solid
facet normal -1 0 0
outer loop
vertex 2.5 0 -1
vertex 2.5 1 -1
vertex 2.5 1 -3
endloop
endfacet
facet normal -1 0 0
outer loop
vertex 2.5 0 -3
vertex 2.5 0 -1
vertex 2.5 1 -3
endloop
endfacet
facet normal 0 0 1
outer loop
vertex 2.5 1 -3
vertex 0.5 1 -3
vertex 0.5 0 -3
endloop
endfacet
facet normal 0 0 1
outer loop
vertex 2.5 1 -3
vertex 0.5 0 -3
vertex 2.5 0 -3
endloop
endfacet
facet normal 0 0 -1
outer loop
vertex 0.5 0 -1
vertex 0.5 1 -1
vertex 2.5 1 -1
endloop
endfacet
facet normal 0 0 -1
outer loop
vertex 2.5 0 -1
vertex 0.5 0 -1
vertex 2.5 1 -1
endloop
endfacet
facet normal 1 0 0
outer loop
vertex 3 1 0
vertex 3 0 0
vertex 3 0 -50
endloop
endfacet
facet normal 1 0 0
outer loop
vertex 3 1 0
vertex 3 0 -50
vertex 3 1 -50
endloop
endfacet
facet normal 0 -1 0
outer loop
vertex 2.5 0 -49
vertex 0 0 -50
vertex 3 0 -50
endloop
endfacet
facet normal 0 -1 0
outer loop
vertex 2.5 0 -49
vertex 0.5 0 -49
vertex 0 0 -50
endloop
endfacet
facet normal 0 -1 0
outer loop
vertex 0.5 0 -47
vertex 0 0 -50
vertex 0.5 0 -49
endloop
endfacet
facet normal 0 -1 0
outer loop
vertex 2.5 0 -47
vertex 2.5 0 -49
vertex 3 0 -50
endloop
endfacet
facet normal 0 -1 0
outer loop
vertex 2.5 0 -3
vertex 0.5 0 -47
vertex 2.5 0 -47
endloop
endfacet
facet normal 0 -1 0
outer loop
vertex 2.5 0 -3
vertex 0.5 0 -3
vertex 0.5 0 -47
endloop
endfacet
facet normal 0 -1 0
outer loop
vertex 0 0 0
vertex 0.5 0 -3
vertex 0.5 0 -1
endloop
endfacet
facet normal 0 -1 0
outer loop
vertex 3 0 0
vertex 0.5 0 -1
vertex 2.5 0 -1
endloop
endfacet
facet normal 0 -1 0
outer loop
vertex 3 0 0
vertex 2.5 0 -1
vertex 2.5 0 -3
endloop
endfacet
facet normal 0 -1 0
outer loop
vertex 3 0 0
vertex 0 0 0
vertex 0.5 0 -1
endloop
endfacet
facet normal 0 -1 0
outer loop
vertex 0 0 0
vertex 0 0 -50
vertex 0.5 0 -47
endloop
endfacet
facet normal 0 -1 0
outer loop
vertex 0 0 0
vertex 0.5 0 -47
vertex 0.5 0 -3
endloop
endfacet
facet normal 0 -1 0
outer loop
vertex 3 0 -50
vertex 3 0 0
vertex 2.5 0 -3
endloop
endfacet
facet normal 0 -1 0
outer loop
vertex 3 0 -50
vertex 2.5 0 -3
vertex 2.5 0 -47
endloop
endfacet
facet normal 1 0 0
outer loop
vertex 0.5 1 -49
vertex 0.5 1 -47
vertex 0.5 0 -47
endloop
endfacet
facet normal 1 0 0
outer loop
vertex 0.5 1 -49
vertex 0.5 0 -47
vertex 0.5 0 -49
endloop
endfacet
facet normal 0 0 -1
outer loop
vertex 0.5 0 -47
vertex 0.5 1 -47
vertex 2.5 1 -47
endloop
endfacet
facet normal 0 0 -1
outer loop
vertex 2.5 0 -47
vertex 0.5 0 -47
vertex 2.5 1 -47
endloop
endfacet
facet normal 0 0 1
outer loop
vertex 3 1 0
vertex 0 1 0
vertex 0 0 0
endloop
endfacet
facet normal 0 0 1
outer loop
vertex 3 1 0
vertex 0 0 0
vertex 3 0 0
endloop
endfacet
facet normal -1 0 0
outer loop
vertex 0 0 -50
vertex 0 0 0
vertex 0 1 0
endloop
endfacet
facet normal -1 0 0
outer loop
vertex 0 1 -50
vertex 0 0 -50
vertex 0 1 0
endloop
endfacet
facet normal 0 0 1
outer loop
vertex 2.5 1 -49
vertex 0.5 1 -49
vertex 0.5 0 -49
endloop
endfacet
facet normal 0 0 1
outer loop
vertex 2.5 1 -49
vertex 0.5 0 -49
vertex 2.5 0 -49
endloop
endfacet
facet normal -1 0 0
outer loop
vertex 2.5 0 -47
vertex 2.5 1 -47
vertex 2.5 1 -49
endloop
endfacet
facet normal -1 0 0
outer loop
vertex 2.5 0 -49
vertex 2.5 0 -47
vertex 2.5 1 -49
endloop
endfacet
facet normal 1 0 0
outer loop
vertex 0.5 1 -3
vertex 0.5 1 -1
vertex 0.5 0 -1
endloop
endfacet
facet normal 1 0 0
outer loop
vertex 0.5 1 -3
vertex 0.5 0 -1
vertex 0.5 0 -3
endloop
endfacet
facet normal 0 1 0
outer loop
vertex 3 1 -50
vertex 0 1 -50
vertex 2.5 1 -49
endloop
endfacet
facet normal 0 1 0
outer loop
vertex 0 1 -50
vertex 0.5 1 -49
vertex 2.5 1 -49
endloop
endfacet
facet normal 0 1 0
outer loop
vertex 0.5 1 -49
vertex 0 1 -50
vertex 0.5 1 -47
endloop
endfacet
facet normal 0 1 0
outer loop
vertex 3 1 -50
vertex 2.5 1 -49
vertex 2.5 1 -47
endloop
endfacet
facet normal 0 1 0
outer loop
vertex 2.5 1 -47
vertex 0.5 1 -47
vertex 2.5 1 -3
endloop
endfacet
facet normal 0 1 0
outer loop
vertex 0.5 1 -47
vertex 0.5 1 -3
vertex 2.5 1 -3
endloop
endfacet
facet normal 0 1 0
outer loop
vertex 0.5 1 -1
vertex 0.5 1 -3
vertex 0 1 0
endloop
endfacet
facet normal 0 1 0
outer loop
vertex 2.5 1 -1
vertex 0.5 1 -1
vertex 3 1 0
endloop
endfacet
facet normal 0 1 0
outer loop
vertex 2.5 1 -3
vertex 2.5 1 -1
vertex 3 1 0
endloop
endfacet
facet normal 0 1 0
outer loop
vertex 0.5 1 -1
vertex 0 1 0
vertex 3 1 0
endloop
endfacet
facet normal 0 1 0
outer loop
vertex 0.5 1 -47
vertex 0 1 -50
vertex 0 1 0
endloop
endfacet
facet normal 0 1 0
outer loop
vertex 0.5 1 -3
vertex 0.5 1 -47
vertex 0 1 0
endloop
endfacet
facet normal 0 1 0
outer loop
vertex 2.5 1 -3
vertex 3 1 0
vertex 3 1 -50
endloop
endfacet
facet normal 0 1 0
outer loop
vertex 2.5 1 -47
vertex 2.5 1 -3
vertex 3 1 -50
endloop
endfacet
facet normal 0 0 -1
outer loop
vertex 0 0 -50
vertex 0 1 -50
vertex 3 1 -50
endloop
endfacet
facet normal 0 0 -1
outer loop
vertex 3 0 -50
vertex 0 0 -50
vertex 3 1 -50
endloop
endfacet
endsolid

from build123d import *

# Parameters (mm, degrees)
ESBO_O1_W                = 3
ESBO_O1_H                = 1
RESSALTO_EXTRUS_O1_DEPTH = 50
ESBO_O3_W                = 2
ESBO_O3_H                = 2
CORTE_EXTRUS_O1_DEPTH    = 44


with BuildPart() as part:
    # Esboço1 → Ressalto-extrusão1 (new body)
    with BuildSketch(Plane.XY):
        with Locations((1.5, 0.5)):
            Rectangle(ESBO_O1_W, ESBO_O1_H)
    extrude(amount=-RESSALTO_EXTRUS_O1_DEPTH)

    # Esboço3 → Corte-extrusão1 (cut)
    with BuildSketch(Plane(origin=(0, 1, 0), x_dir=(1, 0, 0), z_dir=(0, 1, 0))):
        with Locations((1.5, 2)):
            Rectangle(ESBO_O3_W, ESBO_O3_H)
        with Locations((1.5, 48)):
            Rectangle(ESBO_O3_W, ESBO_O3_H)
    extrude(amount=-CORTE_EXTRUS_O1_DEPTH, mode=Mode.SUBTRACT)


solid = part.part
